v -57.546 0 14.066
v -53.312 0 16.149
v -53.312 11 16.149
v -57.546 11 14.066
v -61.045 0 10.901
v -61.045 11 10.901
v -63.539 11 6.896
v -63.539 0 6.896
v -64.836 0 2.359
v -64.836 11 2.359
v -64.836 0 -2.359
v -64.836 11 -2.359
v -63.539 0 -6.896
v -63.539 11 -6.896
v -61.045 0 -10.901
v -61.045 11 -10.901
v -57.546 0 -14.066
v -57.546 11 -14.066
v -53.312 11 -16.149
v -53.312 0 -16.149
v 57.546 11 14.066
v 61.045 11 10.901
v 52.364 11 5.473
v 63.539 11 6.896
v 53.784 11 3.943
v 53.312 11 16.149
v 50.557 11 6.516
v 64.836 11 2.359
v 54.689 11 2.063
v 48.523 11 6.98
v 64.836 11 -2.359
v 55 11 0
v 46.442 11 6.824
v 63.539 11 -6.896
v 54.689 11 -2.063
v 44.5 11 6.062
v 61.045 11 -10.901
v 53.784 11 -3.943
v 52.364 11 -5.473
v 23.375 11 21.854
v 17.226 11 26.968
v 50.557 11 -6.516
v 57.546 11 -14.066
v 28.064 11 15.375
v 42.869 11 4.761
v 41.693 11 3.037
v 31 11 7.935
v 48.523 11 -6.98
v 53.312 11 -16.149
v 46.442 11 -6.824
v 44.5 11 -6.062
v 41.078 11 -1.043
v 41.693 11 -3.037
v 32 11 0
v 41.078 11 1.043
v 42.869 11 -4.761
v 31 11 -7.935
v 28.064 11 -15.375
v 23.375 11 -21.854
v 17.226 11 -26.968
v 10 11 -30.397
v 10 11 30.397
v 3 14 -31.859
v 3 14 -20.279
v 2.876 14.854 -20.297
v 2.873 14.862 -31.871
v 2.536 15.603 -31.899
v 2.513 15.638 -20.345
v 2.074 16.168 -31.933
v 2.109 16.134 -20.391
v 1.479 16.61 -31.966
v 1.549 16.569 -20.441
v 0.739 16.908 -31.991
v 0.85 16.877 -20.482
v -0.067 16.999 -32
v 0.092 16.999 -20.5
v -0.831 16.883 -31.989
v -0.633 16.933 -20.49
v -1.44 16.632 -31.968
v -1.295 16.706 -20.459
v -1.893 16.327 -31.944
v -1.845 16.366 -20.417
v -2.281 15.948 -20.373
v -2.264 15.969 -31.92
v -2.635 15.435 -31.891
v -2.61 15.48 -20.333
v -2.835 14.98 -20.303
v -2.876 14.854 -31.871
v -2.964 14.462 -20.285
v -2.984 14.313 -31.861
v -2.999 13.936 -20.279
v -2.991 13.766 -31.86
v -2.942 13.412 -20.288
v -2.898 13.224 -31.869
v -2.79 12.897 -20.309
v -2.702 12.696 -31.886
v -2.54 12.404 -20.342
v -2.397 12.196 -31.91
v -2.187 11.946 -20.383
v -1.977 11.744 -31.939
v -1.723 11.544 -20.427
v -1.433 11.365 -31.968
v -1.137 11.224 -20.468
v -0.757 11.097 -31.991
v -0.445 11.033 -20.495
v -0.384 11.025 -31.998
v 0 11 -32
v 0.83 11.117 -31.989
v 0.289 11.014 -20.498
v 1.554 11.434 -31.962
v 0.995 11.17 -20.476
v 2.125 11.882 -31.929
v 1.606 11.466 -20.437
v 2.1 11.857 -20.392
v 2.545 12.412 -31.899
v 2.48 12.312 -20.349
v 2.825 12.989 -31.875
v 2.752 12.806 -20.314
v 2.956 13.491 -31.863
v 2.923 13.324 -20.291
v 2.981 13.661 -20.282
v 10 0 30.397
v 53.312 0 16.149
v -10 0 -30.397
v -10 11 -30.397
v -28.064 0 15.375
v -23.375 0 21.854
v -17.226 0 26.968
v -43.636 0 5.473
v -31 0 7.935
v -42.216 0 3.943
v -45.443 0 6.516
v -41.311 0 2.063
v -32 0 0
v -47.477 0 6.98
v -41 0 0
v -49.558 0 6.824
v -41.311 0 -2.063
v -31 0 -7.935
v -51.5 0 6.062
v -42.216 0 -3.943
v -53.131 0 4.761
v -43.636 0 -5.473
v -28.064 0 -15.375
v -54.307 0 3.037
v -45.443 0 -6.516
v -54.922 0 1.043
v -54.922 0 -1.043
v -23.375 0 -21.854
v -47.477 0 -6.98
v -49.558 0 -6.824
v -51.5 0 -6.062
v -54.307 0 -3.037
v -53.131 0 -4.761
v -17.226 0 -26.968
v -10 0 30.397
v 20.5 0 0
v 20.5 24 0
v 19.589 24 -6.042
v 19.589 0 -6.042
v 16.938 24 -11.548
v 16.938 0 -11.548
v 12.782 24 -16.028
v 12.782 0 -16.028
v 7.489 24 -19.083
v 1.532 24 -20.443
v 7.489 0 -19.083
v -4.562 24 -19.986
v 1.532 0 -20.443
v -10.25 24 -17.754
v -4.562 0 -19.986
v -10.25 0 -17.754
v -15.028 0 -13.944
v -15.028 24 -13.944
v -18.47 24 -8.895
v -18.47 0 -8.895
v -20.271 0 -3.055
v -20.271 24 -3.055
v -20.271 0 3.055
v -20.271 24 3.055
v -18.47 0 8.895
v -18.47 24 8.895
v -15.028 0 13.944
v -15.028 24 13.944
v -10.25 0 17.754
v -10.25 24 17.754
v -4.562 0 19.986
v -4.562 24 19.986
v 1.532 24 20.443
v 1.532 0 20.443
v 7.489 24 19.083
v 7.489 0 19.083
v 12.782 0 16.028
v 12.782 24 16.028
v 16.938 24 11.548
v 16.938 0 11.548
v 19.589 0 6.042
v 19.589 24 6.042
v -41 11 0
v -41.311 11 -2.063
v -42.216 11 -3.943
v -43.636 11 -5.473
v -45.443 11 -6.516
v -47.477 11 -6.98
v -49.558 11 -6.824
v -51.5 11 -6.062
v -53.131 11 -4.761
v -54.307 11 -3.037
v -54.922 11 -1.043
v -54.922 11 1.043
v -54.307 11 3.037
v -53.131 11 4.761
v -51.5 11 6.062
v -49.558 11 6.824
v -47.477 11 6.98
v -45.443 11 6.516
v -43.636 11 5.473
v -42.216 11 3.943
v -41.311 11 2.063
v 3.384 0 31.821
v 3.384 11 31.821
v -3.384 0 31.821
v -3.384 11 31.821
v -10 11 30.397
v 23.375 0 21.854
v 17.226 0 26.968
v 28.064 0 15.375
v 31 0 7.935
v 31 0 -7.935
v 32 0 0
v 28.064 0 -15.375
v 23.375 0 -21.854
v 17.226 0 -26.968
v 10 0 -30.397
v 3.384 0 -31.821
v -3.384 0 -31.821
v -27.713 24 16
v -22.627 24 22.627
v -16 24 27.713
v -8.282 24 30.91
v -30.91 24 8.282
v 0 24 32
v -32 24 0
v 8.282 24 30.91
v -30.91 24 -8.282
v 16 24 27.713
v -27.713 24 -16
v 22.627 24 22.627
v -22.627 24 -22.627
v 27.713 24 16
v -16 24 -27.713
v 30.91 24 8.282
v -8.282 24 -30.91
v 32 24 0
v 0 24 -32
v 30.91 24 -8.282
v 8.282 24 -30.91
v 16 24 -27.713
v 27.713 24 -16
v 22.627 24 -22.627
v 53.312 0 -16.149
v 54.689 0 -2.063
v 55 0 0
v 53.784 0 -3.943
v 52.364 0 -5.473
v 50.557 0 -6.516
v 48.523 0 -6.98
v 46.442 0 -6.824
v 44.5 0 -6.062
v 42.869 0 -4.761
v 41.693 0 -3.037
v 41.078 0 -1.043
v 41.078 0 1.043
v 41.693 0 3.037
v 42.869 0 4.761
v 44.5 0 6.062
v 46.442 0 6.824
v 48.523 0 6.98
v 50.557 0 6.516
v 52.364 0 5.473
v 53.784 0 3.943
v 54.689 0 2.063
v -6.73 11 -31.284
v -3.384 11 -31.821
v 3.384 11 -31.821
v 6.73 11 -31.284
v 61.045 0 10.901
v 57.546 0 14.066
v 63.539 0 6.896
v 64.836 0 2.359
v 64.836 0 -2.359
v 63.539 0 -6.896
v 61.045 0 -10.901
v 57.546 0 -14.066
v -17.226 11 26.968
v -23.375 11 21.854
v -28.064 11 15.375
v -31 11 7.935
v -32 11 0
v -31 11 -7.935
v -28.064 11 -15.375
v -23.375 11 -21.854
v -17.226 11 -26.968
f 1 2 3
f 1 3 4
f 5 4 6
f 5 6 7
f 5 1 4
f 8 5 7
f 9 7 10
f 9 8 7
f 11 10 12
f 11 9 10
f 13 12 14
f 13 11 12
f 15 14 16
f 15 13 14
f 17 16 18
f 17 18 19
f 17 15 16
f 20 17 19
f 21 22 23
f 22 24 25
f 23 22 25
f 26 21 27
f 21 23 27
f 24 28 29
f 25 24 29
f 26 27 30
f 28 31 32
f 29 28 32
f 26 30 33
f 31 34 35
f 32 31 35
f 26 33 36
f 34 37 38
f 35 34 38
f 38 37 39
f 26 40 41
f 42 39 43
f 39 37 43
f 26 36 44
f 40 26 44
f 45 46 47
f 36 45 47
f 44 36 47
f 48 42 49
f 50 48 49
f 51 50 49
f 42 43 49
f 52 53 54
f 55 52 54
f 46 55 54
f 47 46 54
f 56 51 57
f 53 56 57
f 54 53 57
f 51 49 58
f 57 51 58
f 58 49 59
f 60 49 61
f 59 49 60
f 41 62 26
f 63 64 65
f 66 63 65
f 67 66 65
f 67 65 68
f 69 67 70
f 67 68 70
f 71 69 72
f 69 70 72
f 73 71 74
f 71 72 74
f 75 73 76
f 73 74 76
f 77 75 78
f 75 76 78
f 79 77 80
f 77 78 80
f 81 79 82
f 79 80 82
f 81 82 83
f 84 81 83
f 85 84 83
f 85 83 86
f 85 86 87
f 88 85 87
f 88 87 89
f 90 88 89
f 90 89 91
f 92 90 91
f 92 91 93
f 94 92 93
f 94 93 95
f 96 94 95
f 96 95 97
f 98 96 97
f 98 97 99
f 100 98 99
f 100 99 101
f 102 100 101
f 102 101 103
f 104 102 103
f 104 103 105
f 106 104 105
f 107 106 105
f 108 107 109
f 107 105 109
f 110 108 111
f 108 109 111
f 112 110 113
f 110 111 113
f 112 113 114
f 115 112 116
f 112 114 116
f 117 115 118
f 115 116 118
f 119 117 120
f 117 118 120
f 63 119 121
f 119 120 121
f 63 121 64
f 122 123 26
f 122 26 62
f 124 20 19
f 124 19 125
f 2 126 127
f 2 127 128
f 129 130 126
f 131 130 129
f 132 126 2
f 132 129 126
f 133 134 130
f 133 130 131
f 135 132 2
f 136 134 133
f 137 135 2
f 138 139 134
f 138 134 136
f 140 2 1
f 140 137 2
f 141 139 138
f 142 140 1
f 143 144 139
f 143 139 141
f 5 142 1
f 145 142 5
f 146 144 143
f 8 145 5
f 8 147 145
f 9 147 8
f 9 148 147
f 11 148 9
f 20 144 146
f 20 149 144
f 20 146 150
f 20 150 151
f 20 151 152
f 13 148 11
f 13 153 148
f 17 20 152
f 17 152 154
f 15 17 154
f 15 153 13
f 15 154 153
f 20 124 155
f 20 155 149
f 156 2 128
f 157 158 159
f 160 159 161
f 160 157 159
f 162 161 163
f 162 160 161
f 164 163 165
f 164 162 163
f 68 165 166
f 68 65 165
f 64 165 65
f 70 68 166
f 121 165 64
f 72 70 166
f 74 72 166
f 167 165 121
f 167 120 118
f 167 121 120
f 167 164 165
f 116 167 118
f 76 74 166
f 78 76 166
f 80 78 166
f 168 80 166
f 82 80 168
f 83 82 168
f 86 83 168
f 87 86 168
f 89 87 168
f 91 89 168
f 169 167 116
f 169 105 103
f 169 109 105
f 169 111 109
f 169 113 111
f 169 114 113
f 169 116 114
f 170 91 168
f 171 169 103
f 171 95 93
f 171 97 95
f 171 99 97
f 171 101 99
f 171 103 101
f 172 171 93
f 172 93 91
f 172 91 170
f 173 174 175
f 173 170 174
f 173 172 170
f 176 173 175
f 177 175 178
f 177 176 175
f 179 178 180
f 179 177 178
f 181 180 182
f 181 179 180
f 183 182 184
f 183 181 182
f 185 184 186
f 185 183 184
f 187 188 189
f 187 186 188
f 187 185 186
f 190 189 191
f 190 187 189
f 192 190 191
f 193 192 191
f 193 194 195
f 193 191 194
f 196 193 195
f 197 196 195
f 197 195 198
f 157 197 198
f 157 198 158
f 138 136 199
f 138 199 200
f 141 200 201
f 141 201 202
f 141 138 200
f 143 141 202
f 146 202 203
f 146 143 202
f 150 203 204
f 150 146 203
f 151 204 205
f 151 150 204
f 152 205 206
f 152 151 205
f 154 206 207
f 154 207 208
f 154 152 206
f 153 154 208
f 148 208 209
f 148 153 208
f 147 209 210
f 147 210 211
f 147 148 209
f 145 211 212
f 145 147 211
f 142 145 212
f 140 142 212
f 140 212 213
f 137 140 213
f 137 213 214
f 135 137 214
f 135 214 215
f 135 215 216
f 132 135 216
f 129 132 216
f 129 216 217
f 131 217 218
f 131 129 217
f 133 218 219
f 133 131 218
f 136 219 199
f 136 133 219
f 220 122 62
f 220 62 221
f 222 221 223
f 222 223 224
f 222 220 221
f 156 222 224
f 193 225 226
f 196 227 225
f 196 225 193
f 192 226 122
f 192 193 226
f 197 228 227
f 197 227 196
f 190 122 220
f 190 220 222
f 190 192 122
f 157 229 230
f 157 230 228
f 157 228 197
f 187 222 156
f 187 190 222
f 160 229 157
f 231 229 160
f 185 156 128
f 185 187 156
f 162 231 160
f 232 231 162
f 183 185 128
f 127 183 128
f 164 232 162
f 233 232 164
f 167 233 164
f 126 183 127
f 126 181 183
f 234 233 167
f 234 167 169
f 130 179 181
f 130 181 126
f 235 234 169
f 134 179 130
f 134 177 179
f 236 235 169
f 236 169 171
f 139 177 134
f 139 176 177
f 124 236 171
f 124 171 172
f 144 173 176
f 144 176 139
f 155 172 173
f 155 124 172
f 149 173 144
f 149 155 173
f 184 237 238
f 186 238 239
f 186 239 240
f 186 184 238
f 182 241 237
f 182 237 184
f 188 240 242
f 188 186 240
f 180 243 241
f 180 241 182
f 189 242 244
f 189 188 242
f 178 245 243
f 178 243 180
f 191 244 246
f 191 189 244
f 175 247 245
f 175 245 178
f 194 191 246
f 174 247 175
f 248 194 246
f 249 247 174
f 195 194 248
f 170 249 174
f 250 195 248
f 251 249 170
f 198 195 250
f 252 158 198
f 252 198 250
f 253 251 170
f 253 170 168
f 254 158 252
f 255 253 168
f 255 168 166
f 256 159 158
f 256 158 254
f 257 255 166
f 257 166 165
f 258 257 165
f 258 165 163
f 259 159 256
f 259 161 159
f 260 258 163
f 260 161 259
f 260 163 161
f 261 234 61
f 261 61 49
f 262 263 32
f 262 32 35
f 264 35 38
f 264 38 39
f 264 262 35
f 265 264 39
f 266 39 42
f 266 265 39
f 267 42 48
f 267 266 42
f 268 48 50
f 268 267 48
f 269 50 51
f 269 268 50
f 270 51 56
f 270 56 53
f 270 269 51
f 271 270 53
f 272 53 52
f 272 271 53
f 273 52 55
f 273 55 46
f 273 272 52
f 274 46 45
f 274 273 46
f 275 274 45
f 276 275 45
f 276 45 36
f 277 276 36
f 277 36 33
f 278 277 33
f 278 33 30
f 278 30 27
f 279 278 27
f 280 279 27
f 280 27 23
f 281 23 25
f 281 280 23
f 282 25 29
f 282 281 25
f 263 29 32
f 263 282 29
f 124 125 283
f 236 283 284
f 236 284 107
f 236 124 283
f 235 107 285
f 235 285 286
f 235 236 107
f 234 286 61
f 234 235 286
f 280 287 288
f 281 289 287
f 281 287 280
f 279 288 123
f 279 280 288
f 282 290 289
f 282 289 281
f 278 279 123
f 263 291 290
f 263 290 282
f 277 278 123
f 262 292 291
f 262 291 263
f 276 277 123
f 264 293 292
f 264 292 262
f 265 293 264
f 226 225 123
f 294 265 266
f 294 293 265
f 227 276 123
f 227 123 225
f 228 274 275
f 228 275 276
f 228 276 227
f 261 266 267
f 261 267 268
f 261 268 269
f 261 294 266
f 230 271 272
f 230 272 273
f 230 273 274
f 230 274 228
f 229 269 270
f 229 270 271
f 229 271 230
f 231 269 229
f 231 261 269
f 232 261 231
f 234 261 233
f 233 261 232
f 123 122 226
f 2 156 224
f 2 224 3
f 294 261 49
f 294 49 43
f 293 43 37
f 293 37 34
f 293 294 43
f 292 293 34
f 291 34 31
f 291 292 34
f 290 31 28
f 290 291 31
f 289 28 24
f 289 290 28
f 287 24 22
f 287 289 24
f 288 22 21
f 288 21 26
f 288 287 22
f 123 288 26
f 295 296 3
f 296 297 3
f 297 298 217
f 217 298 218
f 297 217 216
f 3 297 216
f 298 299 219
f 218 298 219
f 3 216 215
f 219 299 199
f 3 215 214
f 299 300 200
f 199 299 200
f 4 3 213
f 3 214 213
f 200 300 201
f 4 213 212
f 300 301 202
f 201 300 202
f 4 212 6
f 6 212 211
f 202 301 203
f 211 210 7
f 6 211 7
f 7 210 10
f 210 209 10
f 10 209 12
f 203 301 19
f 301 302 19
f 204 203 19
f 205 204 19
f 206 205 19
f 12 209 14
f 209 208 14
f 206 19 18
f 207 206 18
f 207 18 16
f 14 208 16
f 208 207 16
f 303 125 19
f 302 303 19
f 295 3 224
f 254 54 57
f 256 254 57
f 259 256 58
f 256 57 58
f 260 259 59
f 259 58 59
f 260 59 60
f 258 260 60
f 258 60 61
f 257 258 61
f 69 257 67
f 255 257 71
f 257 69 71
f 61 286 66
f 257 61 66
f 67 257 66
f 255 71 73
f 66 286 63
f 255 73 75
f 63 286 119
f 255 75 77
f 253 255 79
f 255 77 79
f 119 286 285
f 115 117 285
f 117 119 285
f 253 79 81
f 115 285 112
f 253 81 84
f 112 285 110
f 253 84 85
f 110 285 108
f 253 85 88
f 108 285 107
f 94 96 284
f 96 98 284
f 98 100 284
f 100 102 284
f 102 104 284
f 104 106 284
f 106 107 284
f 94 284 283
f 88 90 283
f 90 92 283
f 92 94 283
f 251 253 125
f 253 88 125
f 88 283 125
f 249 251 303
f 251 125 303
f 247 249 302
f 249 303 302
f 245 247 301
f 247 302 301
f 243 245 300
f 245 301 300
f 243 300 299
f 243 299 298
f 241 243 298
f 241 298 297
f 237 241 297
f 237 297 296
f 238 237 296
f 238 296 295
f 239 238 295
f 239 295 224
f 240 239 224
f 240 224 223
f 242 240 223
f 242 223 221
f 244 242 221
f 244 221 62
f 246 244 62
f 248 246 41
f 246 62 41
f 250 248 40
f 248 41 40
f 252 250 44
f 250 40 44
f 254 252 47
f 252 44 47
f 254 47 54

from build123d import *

# Parameters (mm, degrees)
EXTRUDE_2_DEPTH     = 11
SKETCH_2_R          = 7
CUT_EXTRUDE_1_DEPTH = 11
SKETCH_3_R          = 32
EXTRUDE_3_DEPTH     = 24
SKETCH_4_R          = 20.5
CUT_EXTRUDE_2_DEPTH = 25
SKETCH_5_R          = 3
CUT_EXTRUDE_3_DEPTH = 33


with BuildPart() as part:
    # 스케치1 → 보스-돌출2 (new body)
    with BuildSketch(Plane(origin=(0, 0, 0), x_dir=(1, 0, 0), z_dir=(0, 1, 0))):
        with BuildLine():
            Line((-53.3125, 16.148601913), (-10, 30.397368307))
            ThreePointArc((-10, 30.397368307), (0, 32), (10, 30.397368307))
            Line((10, 30.397368307), (53.3125, 16.148601913))
            ThreePointArc((53.3125, 16.148601913), (65, 0), (53.3125, -16.148601913))
            Line((53.3125, -16.148601913), (10, -30.397368307))
            ThreePointArc((10, -30.397368307), (0, -32), (-10, -30.397368307))
            Line((-10, -30.397368307), (-53.3125, -16.148601913))
            ThreePointArc((-53.3125, -16.148601913), (-65, 0), (-53.3125, 16.148601913))
        make_face()
    extrude(amount=EXTRUDE_2_DEPTH)

    # 스케치2 → 컷-돌출1 (cut)
    with BuildSketch(Plane(origin=(0, 0, 0), x_dir=(1, 0, 0), z_dir=(0, 1, 0))):
        with Locations((-48, 0)):
            Circle(SKETCH_2_R)
        with Locations((48, 0)):
            Circle(SKETCH_2_R)
    extrude(amount=CUT_EXTRUDE_1_DEPTH, mode=Mode.SUBTRACT)

    # 스케치3 → 보스-돌출3 (add)
    with BuildSketch(Plane(origin=(0, 0, 0), x_dir=(1, 0, 0), z_dir=(0, 1, 0))):
        Circle(SKETCH_3_R)
    extrude(amount=EXTRUDE_3_DEPTH)

    # 스케치4 → 컷-돌출2 (cut, through all)
    with BuildSketch(Plane(origin=(0, 0, 0), x_dir=(1, 0, 0), z_dir=(0, 1, 0))):
        Circle(SKETCH_4_R)
    extrude(amount=CUT_EXTRUDE_2_DEPTH, mode=Mode.SUBTRACT)

    # 스케치5 → 컷-돌출3 (cut, through all)
    with BuildSketch(Plane.XY):
        with Locations((0, 14)):
            Circle(SKETCH_5_R)
    extrude(amount=-CUT_EXTRUDE_3_DEPTH, mode=Mode.SUBTRACT)


solid = part.part
